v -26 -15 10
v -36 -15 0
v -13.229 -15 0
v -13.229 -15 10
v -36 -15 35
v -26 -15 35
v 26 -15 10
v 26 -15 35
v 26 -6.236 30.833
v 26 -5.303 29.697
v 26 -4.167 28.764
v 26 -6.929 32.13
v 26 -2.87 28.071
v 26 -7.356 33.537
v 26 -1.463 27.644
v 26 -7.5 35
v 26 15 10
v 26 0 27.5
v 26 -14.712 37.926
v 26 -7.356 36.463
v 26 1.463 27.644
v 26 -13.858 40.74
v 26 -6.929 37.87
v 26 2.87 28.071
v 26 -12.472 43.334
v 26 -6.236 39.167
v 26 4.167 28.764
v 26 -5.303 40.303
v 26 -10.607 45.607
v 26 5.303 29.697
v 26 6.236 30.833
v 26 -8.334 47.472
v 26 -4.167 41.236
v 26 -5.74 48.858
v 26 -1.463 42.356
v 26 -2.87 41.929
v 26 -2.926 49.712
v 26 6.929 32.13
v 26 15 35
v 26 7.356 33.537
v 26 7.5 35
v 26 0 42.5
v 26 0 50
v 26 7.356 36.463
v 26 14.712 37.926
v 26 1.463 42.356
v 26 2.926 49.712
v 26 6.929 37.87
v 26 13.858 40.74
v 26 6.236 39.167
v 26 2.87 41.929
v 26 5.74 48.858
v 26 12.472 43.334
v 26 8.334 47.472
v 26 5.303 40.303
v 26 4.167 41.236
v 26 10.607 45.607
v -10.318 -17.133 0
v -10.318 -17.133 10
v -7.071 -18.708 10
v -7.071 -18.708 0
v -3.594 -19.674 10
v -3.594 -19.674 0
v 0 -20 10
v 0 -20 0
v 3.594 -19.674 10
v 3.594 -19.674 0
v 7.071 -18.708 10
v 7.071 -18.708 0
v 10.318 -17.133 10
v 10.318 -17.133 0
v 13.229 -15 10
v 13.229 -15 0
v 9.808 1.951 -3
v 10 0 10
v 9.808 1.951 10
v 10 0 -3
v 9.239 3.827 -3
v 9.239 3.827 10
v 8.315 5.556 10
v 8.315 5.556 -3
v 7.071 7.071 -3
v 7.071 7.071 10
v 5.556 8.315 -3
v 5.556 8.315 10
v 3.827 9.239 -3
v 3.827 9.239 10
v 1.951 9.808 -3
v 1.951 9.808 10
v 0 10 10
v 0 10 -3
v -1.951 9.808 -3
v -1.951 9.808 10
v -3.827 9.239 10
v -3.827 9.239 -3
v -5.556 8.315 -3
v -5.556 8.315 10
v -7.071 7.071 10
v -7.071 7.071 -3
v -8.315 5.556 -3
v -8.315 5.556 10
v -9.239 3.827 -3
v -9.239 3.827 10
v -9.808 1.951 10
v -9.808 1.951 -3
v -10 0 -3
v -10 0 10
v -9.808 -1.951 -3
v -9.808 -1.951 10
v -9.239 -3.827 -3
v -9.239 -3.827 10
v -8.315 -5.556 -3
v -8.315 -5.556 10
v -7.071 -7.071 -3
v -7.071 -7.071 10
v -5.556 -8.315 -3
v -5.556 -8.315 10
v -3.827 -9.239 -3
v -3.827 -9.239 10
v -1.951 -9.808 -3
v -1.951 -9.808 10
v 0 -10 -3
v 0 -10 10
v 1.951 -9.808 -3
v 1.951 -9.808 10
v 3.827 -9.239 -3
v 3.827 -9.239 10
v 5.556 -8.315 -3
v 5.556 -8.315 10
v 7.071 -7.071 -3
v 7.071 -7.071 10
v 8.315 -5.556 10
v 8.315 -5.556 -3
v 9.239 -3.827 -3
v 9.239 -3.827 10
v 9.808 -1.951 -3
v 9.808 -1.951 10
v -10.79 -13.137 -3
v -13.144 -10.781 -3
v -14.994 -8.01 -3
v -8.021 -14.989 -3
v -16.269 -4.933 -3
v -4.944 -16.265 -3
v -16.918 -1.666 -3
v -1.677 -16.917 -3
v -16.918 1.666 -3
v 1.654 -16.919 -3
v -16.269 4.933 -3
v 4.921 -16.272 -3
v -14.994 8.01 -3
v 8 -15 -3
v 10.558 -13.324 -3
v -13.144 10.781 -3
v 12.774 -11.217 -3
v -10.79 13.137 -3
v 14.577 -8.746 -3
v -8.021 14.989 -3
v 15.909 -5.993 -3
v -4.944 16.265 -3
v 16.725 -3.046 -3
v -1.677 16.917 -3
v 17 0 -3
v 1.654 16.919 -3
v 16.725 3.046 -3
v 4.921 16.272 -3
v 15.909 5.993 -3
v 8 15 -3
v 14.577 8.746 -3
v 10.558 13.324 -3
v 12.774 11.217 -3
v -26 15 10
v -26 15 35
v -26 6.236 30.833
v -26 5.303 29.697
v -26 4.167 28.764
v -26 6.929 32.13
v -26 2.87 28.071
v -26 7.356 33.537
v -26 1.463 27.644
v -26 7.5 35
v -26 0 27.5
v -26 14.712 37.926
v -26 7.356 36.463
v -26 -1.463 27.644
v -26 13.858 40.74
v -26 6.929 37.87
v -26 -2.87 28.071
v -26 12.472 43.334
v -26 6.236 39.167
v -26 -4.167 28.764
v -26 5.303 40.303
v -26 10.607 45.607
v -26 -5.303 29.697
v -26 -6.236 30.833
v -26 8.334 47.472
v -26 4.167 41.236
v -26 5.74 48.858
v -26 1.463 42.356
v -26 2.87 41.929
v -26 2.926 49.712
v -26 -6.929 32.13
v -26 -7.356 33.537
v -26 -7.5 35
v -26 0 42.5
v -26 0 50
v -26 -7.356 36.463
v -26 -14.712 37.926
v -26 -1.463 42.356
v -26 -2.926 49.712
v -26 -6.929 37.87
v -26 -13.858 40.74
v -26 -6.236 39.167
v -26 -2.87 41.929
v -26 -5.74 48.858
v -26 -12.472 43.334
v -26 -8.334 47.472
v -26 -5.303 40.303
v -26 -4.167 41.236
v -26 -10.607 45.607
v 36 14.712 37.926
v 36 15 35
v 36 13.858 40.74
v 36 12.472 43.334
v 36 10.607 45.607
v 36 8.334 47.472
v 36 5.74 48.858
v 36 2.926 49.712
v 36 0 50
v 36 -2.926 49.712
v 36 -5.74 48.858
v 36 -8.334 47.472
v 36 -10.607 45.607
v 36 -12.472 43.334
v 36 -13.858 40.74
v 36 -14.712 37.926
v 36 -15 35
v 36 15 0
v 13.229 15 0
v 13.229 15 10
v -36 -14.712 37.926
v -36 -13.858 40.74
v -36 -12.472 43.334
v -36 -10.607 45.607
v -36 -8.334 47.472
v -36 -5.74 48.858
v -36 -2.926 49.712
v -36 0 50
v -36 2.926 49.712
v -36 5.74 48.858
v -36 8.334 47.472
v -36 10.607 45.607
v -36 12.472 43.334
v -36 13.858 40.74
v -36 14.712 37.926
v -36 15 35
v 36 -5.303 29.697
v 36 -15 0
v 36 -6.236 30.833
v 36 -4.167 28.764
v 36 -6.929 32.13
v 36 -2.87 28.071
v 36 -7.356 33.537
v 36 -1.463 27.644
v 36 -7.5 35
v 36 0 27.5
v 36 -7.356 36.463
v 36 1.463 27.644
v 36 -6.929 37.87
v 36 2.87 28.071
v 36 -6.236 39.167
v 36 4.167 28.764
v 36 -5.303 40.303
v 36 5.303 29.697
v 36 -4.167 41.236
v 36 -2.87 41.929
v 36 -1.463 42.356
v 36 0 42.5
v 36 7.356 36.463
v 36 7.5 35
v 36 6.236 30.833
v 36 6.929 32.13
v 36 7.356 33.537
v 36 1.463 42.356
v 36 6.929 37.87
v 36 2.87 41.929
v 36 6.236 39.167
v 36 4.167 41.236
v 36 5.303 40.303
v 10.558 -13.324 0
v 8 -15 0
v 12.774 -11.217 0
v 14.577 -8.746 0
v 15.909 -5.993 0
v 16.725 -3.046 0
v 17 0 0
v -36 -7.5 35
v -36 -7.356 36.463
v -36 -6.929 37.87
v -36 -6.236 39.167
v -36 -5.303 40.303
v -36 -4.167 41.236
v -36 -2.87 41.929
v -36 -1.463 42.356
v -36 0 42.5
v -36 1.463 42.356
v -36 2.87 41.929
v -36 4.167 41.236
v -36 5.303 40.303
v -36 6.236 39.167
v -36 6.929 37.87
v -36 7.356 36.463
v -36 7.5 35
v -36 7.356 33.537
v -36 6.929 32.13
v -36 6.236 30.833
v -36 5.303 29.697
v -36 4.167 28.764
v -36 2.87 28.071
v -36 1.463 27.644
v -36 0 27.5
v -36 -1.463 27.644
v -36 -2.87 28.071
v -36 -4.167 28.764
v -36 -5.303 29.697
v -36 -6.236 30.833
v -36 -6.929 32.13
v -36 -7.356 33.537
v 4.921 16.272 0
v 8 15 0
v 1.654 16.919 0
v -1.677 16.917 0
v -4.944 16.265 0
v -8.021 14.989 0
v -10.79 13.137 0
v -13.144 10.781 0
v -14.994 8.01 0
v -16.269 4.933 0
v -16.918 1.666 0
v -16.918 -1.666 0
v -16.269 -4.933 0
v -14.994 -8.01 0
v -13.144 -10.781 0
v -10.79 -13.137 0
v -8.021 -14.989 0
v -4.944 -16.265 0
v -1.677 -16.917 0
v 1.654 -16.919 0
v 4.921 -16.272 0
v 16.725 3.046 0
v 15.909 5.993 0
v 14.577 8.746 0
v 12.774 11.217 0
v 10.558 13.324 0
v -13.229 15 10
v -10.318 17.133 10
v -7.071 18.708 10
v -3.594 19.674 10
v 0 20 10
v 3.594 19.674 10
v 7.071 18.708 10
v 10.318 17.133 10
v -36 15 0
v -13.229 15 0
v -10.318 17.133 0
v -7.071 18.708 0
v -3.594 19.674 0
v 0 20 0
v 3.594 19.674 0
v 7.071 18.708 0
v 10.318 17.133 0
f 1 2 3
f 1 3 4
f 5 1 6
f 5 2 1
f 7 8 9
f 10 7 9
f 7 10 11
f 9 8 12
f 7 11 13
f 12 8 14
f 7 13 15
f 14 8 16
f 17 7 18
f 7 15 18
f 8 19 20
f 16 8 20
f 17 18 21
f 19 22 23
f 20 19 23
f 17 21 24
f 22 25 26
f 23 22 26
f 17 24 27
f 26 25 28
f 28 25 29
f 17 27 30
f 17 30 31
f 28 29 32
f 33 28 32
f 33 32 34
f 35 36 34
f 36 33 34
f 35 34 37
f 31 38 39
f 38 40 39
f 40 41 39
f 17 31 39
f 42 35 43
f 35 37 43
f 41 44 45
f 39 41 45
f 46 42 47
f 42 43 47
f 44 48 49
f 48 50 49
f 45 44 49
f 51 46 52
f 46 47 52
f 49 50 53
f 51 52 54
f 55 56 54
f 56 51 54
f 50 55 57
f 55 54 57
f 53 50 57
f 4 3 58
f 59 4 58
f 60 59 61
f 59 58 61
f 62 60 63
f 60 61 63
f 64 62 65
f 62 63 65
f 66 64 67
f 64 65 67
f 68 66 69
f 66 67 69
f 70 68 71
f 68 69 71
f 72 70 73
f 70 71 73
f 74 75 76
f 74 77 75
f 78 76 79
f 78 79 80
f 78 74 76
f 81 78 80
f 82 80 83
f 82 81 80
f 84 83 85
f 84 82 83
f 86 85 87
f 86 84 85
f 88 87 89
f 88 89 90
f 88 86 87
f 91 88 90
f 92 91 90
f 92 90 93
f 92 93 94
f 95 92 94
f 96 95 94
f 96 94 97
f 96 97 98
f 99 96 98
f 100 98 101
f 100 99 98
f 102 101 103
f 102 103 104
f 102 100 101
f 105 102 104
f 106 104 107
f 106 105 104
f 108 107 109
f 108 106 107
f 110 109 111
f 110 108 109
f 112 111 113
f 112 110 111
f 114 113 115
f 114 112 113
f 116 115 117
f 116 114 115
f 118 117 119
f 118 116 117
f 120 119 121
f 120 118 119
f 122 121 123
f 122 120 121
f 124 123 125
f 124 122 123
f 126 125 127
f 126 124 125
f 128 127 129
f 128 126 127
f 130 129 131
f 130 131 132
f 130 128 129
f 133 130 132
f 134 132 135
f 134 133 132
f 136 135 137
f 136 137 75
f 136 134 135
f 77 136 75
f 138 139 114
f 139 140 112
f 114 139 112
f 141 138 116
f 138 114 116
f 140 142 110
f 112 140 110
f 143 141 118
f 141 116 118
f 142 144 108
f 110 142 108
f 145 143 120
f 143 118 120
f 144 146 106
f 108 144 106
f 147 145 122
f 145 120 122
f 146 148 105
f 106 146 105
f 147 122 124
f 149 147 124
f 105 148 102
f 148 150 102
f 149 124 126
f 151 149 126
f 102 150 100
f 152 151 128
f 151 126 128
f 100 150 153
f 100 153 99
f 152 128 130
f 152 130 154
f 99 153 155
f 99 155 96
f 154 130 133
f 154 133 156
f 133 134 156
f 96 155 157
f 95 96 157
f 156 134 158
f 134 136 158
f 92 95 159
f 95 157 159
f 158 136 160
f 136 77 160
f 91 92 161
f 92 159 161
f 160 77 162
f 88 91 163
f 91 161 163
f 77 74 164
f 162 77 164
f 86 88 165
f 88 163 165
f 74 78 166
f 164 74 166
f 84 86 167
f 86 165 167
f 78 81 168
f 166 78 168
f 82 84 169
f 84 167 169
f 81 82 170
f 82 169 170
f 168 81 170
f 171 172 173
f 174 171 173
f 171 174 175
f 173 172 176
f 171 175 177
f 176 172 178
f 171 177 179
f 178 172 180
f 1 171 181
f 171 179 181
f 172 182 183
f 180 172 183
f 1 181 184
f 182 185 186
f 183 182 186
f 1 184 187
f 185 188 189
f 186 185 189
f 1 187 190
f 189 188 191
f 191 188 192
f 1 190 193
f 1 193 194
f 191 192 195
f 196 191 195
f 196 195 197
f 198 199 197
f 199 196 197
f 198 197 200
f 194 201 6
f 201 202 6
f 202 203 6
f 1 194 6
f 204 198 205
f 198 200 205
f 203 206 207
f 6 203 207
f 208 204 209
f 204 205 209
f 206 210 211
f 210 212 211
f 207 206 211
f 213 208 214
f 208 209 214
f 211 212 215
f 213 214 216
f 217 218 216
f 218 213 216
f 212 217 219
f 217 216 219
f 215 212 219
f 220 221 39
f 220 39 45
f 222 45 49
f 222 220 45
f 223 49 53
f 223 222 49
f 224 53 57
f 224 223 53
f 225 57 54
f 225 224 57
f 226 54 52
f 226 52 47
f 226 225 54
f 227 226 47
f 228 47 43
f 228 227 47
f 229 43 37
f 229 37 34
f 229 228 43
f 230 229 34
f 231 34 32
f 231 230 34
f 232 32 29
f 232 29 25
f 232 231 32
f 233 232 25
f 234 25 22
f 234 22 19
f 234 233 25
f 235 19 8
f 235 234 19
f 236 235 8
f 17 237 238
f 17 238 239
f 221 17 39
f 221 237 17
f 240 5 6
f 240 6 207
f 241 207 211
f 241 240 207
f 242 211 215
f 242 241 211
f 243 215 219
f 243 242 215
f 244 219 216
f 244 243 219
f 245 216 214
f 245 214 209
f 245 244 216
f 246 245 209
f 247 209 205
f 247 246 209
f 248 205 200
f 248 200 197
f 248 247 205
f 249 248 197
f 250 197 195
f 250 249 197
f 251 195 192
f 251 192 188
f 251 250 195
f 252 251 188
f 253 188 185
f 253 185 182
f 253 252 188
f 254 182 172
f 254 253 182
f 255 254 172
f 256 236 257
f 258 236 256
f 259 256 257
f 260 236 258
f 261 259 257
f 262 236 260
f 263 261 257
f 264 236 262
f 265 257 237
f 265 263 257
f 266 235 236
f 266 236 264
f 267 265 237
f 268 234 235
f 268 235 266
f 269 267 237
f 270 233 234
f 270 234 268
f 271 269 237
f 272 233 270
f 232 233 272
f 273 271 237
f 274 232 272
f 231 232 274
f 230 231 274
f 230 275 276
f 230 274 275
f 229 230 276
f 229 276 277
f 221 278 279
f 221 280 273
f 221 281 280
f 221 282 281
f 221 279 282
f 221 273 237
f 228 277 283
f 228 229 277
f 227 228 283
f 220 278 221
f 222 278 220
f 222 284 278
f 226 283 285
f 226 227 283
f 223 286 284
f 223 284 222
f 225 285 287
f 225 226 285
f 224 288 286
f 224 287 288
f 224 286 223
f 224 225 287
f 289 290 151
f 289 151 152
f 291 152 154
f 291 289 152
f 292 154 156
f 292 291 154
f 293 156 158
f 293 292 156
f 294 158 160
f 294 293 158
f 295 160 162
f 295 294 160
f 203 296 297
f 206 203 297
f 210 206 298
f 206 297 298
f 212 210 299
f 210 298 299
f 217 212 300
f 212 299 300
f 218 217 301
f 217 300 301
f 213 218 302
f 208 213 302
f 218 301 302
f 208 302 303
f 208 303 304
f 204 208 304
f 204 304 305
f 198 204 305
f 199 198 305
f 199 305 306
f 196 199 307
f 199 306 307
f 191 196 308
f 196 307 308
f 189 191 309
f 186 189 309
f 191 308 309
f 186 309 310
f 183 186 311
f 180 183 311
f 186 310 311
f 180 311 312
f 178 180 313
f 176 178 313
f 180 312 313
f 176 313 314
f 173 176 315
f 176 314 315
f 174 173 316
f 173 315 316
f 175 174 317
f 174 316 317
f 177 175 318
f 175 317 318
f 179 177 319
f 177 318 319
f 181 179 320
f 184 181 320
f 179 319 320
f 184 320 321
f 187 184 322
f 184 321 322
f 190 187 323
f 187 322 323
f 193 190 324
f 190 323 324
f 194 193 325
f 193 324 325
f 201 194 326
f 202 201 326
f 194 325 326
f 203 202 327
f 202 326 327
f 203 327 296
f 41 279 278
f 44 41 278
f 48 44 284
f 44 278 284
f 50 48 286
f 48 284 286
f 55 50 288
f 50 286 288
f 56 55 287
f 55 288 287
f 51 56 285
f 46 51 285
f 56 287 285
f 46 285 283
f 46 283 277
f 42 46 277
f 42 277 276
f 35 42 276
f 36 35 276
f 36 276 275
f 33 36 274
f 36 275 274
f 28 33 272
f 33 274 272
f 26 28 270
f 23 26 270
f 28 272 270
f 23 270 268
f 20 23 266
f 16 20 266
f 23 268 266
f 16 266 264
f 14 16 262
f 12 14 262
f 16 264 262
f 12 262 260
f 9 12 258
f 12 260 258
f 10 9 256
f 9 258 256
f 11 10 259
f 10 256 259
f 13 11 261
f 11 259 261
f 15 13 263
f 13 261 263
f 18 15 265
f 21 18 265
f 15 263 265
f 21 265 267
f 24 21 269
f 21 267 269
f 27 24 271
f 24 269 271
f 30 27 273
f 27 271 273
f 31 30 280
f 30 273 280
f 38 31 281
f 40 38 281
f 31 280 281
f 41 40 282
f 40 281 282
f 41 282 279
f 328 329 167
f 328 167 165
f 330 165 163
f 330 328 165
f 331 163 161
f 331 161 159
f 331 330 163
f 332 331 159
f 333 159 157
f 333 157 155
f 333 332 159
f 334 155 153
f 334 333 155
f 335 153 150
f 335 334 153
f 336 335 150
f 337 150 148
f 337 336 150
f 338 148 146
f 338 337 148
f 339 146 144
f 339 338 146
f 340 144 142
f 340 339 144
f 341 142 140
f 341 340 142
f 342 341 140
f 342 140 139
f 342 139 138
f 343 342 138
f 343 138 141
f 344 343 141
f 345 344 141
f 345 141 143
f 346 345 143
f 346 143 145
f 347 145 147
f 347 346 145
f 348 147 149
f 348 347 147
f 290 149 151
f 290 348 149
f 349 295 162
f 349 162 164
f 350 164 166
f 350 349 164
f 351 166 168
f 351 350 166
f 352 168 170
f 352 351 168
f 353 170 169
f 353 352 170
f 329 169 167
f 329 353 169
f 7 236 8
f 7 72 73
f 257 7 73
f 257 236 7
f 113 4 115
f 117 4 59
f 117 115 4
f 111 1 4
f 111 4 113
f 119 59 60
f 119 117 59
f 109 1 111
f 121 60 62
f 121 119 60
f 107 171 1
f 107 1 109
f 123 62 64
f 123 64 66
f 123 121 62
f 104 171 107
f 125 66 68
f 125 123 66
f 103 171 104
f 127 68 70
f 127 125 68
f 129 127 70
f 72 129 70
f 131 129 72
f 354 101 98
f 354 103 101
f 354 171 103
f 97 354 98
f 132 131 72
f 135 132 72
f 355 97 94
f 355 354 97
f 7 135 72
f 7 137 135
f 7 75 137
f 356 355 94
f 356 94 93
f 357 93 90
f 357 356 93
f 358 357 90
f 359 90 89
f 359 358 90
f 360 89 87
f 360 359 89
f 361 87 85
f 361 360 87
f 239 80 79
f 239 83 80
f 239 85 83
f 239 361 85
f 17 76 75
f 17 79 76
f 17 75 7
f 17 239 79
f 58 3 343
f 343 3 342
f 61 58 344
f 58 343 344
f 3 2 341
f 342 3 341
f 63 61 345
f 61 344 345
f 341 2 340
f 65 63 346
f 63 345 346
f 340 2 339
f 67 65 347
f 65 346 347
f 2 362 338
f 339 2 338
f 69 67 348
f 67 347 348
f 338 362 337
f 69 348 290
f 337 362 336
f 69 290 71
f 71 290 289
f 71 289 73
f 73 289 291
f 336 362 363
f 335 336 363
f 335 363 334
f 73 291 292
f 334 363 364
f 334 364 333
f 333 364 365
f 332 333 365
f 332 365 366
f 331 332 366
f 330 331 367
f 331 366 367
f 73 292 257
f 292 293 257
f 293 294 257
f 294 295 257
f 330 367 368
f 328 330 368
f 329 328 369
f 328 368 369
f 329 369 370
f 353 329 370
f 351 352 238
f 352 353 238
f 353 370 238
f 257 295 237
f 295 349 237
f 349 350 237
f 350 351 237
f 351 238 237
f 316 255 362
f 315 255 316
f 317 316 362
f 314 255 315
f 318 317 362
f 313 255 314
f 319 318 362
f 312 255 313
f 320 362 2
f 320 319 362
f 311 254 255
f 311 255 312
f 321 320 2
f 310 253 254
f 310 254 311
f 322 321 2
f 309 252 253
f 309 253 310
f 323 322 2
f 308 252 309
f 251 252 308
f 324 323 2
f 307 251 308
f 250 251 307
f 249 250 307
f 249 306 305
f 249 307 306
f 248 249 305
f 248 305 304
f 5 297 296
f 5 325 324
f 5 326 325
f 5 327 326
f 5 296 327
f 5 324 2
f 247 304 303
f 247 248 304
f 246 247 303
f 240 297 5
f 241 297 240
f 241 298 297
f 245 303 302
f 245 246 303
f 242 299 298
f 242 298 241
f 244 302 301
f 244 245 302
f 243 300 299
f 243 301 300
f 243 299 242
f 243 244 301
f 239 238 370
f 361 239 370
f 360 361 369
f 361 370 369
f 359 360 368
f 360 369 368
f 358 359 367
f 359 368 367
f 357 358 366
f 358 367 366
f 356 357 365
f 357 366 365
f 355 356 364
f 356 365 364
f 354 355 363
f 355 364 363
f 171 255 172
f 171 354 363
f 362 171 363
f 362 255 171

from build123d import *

# Parameters (mm, degrees)
F0_R        = 10
F1_DEPTH    = 10
F2_DEPTH    = 3
F2_FACE_R   = 17
F2_FACE_R_2 = 10
F4_DEPTH    = 10
F5_R        = 7.5
F6_DEPTH    = 10
F8_R        = 7.5
F9_DEPTH    = 10


with BuildPart() as f1:
    # F0 (on Top) → F1 (new body)
    with BuildSketch(Plane.XY):
        with BuildLine():
            Line((-36, -15), (-13.2287565553, -15))
            ThreePointArc((-13.2287565553, -15), (-20, 0), (-13.2287565553, 15))
            Line((-13.2287565553, 15), (-36, 15))
            Line((-36, 15), (-36, -15))
        make_face()
        with BuildLine():
            Line((-8, -15), (8, -15))
            ThreePointArc((8, -15), (14.5773797371, -8.7464278423), (17, 0))
            ThreePointArc((17, 0), (14.5773797371, 8.7464278423), (8, 15))
            Line((8, 15), (-8, 15))
            ThreePointArc((-8, 15), (-17, 0), (-8, -15))
        make_face()
        Circle(F0_R, mode=Mode.SUBTRACT)
        with BuildLine():
            Line((13.2287565553, -15), (36, -15))
            Line((36, -15), (36, 15))
            Line((36, 15), (13.2287565553, 15))
            ThreePointArc((13.2287565553, 15), (18.2287565553, 8.2287565553), (20, 0))
            ThreePointArc((20, 0), (18.2287565553, -8.2287565553), (13.2287565553, -15))
        make_face()
        with BuildLine():
            ThreePointArc((-13.2287565553, 15), (-20, 0), (-13.2287565553, -15))
            Line((-13.2287565553, -15), (-8, -15))
            ThreePointArc((-8, -15), (-17, 0), (-8, 15))
            Line((-8, 15), (-13.2287565553, 15))
        make_face()
        with BuildLine():
            Line((8, -15), (13.2287565553, -15))
            ThreePointArc((13.2287565553, -15), (18.2287565553, -8.2287565553), (20, 0))
            ThreePointArc((20, 0), (18.2287565553, 8.2287565553), (13.2287565553, 15))
            Line((13.2287565553, 15), (8, 15))
            ThreePointArc((8, 15), (14.5773797371, 8.7464278423), (17, 0))
            ThreePointArc((17, 0), (14.5773797371, -8.7464278423), (8, -15))
        make_face()
    extrude(amount=F1_DEPTH)

    # F0 (on Top) → F2 (join)
    with BuildSketch(Plane.XY):
        with BuildLine():
            Line((-8, -15), (8, -15))
            ThreePointArc((8, -15), (14.5773797371, -8.7464278423), (17, 0))
            ThreePointArc((17, 0), (14.5773797371, 8.7464278423), (8, 15))
            Line((8, 15), (-8, 15))
            ThreePointArc((-8, 15), (-17, 0), (-8, -15))
        make_face()
        Circle(F0_R, mode=Mode.SUBTRACT)
        with BuildLine():
            ThreePointArc((-8, -15), (0, -17), (8, -15))
            Line((8, -15), (-8, -15))
        make_face()
        with BuildLine():
            Line((-8, 15), (8, 15))
            ThreePointArc((8, 15), (0, 17), (-8, 15))
        make_face()
    extrude(amount=-F2_DEPTH)

    # F0 (on Top) + F2_face (on face) → F4 (join)
    with BuildSketch(Plane.XY):
        with BuildLine():
            ThreePointArc((-13.2287565553, -15), (0, -20), (13.2287565553, -15))
            Line((13.2287565553, -15), (8, -15))
            ThreePointArc((8, -15), (0, -17), (-8, -15))
            Line((-8, -15), (-13.2287565553, -15))
        make_face()
        with BuildLine():
            Line((8, -15), (13.2287565553, -15))
            ThreePointArc((13.2287565553, -15), (18.2287565553, -8.2287565553), (20, 0))
            ThreePointArc((20, 0), (18.2287565553, 8.2287565553), (13.2287565553, 15))
            Line((13.2287565553, 15), (8, 15))
            ThreePointArc((8, 15), (14.5773797371, 8.7464278423), (17, 0))
            ThreePointArc((17, 0), (14.5773797371, -8.7464278423), (8, -15))
        make_face()
        with BuildLine():
            Line((8, 15), (13.2287565553, 15))
            ThreePointArc((13.2287565553, 15), (0, 20), (-13.2287565553, 15))
            Line((-13.2287565553, 15), (-8, 15))
            ThreePointArc((-8, 15), (0, 17), (8, 15))
        make_face()
        with BuildLine():
            ThreePointArc((-13.2287565553, 15), (-20, 0), (-13.2287565553, -15))
            Line((-13.2287565553, -15), (-8, -15))
            ThreePointArc((-8, -15), (-17, 0), (-8, 15))
            Line((-8, 15), (-13.2287565553, 15))
        make_face()
        with BuildLine():
            ThreePointArc((-8, -15), (0, -17), (8, -15))
            Line((8, -15), (-8, -15))
        make_face()
        with BuildLine():
            Line((-8, 15), (8, 15))
            ThreePointArc((8, 15), (0, 17), (-8, 15))
        make_face()
    with BuildSketch(Plane(origin=(0, 0, -3), x_dir=(1, 0, 0), z_dir=(0, 0, -1))):
        Circle(F2_FACE_R)
        Circle(F2_FACE_R_2, mode=Mode.SUBTRACT)
    extrude(amount=F4_DEPTH, dir=(0, 0, 1))

    # F5 (on offset) → F6 (join)
    with BuildSketch(Plane.YZ.offset(36)):
        with BuildLine():
            Line((-15, 35), (-15, 0))
            Line((-15, 0), (15, 0))
            Line((15, 0), (15, 35))
            ThreePointArc((15, 35), (0, 50), (-15, 35))
        make_face()
        with Locations((0, 35)):
            Circle(F5_R, mode=Mode.SUBTRACT)
    extrude(amount=-F6_DEPTH)

    # F8 (on offset) → F9 (join)
    with BuildSketch(Plane(origin=(-36, 0, 0), x_dir=(0, -1, 0), z_dir=(-1, 0, 0))):
        with BuildLine():
            Line((-15, 35), (-15, 0))
            Line((-15, 0), (15, 0))
            Line((15, 0), (15, 35))
            ThreePointArc((15, 35), (0, 50), (-15, 35))
        make_face()
        with Locations((0, 35)):
            Circle(F8_R, mode=Mode.SUBTRACT)
    extrude(amount=-F9_DEPTH)


solid = f1.part
